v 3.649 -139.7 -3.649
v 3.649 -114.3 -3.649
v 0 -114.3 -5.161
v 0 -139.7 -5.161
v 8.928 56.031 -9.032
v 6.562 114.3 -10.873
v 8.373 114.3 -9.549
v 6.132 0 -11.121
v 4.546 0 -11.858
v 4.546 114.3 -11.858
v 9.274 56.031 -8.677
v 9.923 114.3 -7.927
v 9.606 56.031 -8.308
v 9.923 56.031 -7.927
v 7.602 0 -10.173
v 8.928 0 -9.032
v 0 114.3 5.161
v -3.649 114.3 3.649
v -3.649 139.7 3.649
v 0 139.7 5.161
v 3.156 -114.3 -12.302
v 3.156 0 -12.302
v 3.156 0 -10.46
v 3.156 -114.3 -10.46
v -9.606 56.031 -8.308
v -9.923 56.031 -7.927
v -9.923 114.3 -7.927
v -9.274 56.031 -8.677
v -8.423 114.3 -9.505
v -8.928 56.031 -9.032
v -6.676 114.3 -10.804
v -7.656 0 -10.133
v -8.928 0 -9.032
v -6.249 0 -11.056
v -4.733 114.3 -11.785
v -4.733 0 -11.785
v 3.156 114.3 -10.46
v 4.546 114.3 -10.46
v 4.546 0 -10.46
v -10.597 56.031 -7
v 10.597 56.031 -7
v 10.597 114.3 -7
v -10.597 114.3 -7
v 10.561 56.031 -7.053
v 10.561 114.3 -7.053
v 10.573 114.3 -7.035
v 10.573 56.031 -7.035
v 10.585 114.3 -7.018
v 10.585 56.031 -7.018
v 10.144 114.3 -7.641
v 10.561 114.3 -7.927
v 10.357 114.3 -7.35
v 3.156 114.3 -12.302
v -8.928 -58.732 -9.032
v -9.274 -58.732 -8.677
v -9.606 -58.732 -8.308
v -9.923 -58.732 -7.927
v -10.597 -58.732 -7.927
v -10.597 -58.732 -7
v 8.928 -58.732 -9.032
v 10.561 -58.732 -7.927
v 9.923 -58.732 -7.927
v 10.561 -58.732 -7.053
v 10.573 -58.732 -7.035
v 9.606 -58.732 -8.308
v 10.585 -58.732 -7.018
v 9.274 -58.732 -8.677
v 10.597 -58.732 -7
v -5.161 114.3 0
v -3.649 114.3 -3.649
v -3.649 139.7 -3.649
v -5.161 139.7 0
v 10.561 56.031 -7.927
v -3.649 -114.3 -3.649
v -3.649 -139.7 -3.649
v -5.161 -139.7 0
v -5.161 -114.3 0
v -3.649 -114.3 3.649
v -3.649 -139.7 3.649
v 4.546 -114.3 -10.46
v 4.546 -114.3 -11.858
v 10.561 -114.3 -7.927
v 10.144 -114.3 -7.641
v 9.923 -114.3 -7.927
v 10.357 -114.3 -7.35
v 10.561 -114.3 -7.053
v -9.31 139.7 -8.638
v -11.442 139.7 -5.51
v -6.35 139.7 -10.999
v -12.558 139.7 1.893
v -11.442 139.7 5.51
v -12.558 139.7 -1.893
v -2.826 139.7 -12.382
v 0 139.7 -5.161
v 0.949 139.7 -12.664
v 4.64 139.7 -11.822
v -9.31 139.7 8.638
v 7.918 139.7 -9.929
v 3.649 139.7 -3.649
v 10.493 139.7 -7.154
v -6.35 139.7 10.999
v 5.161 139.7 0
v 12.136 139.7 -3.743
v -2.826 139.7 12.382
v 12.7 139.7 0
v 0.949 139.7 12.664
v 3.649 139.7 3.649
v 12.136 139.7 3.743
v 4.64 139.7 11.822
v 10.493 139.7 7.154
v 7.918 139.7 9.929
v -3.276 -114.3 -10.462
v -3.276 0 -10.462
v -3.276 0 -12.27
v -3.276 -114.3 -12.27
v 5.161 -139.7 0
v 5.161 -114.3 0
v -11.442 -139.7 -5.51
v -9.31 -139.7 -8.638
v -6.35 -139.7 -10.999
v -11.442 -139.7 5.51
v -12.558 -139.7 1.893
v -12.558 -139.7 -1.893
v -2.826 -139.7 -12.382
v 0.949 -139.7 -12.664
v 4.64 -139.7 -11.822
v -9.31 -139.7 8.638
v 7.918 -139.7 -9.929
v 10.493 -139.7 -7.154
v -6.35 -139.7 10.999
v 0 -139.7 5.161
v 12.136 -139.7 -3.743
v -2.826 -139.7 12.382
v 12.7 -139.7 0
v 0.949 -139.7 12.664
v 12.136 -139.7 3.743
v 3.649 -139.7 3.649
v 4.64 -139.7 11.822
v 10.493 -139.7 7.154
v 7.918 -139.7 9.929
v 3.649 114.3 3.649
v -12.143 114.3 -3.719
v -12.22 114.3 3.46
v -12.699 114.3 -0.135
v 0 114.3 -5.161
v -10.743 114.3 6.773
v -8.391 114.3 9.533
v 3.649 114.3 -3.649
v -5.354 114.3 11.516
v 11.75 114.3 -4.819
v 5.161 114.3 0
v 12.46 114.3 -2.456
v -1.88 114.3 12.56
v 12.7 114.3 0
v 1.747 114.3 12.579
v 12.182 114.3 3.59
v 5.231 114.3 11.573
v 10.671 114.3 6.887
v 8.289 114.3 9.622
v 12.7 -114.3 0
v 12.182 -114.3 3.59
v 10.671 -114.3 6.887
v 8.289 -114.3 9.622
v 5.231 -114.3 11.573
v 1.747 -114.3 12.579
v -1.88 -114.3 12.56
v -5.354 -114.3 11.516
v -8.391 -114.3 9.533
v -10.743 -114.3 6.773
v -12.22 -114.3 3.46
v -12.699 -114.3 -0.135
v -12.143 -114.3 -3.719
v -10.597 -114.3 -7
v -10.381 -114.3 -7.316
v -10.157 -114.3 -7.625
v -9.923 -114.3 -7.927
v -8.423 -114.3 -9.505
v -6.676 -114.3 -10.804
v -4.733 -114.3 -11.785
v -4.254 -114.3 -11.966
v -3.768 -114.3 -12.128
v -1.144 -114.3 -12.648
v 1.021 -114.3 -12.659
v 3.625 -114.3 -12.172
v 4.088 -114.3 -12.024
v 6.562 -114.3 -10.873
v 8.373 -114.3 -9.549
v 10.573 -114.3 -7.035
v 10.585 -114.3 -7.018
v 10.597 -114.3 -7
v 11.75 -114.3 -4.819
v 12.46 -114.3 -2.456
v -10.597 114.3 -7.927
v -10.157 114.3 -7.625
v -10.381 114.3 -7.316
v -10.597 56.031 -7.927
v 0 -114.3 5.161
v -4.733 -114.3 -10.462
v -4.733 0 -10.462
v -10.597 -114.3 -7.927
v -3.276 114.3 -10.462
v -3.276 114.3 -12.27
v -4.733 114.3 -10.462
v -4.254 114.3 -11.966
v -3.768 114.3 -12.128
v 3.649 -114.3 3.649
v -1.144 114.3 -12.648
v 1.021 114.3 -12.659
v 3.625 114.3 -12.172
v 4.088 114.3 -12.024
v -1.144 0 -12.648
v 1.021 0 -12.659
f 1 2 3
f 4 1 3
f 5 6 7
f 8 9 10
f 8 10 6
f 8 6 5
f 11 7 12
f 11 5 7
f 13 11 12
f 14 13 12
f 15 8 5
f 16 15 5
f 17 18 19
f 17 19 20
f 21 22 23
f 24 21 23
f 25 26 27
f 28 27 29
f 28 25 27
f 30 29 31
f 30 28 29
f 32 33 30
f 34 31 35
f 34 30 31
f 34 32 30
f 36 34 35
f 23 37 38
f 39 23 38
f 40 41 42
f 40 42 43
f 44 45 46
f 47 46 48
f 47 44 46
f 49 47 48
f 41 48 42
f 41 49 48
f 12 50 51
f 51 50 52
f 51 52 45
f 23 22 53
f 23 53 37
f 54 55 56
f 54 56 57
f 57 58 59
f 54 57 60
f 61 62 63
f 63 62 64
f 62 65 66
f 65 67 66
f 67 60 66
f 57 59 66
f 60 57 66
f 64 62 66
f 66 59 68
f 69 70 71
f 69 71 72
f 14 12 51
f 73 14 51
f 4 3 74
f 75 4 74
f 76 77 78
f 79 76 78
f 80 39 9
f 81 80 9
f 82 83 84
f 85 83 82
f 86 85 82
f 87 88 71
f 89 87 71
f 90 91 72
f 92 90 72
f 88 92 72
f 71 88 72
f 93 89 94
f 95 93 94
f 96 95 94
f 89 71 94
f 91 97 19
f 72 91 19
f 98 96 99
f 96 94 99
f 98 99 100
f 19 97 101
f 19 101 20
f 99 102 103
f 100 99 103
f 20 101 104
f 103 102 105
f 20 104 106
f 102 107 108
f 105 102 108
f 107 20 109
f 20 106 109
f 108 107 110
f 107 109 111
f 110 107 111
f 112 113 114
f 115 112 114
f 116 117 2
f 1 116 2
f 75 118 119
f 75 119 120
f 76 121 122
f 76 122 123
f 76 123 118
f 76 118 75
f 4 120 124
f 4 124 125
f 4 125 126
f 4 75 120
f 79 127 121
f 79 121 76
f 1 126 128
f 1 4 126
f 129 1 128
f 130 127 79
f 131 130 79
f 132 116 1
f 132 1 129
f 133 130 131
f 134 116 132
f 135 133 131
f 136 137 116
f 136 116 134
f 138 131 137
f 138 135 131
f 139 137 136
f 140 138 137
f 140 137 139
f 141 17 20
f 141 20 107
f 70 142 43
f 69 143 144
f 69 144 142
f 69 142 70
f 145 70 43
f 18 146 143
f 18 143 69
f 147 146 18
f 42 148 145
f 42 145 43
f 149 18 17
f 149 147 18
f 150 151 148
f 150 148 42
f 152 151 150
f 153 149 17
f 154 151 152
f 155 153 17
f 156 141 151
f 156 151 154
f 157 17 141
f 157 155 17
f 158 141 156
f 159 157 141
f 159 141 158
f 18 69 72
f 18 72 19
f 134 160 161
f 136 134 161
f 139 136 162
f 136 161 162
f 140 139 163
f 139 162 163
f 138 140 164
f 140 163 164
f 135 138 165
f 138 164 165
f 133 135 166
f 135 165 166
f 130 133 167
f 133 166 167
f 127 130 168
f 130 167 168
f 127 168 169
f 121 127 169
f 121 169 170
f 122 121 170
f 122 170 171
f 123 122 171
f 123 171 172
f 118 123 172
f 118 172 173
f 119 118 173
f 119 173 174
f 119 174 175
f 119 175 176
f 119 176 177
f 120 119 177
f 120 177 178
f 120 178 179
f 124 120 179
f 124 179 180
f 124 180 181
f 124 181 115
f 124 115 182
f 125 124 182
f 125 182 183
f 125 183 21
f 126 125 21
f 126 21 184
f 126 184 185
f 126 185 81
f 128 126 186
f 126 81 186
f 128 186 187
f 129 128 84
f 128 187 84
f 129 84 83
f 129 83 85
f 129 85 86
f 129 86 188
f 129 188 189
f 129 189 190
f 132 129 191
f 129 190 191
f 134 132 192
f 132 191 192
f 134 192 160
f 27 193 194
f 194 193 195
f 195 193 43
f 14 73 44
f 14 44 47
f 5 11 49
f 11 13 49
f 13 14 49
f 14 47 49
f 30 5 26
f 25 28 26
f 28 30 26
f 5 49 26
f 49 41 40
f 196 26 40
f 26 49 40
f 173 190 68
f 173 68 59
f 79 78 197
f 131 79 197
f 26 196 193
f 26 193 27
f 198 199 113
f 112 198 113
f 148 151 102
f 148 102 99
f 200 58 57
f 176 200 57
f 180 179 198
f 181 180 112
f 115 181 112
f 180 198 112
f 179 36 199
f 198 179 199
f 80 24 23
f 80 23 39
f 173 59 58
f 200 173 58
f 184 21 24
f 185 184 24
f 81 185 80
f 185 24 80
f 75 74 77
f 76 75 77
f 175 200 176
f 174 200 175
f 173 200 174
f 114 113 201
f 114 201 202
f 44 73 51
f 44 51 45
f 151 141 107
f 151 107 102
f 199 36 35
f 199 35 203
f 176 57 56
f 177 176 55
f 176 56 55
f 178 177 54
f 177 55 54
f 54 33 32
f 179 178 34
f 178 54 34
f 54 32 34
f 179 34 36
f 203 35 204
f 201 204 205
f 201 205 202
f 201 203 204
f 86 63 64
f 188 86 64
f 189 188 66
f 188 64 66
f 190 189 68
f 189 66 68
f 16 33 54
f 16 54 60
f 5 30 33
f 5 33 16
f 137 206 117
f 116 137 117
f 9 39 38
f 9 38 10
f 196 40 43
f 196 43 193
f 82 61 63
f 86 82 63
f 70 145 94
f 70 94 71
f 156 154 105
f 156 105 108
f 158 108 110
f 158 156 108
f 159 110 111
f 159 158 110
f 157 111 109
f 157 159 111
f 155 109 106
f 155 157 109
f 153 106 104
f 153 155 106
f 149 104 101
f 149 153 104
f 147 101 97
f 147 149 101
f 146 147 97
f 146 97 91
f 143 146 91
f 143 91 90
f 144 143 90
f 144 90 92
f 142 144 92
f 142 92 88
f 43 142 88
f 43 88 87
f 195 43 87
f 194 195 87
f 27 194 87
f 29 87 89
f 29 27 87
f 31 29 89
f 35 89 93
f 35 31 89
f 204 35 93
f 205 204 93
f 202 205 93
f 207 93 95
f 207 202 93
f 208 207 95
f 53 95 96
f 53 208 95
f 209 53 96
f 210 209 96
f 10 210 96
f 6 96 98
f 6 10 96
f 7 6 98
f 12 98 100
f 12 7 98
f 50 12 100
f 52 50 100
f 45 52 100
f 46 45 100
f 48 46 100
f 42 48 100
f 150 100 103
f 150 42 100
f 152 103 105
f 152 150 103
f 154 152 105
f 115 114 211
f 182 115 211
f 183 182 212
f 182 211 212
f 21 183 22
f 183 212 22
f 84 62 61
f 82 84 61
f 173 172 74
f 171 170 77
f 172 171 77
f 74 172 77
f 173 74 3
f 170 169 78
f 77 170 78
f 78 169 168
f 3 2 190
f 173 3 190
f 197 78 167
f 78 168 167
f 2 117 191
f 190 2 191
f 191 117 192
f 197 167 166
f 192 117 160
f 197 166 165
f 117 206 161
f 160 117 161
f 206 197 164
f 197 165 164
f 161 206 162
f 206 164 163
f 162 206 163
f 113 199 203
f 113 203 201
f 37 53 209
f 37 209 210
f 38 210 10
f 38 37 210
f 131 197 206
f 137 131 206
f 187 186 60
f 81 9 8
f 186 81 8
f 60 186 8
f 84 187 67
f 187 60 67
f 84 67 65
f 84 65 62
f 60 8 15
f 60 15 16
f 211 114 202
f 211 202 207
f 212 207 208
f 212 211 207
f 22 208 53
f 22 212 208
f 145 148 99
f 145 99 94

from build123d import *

# Parameters (mm, degrees)
F1_DEPTH = 114.3
F2_R     = 12.7
F3_DEPTH = 25.4
F6_DEPTH = 2.032
F7_DEPTH = 25.4


with BuildPart() as f1:
    # F0 (on Front) → F1 (new body)
    with BuildSketch(Plane.XZ):
        with BuildLine():
            Line((10.5614215136, -7), (-10.5966975988, -7))
            ThreePointArc((-10.5966975988, -7), (-10.2701474295, -7.4708815929), (-9.9226886379, -7.9265534878))
            Line((-9.9226886379, -7.9265534878), (9.9226886379, -7.9265534878))
            ThreePointArc((9.9226886379, -7.9265534878), (10.2513617434, -7.4966380736), (10.5614215136, -7.0531110592))
            Line((10.5614215136, -7.0531110592), (10.5614215136, -7))
        make_face()
        with BuildLine():
            ThreePointArc((-9.9226886379, -7.9265534878), (-10.2701474295, -7.4708815929), (-10.5966975988, -7))
            Line((-10.5966975988, -7), (-10.5966975988, -7.9265534878))
            Line((-10.5966975988, -7.9265534878), (-9.9226886379, -7.9265534878))
        make_face()
        with BuildLine():
            Line((9.9226886379, -7.9265534878), (-9.9226886379, -7.9265534878))
            ThreePointArc((-9.9226886379, -7.9265534878), (-7.5775508356, -10.1916987463), (-4.7329799249, -11.7851135349))
            Line((-4.7329799249, -11.7851135349), (-4.7329799249, -10.4623720994))
            Line((-4.7329799249, -10.4623720994), (-3.2759574242, -10.4623720994))
            Line((-3.2759574242, -10.4623720994), (-3.2759574242, -12.2702120175))
            ThreePointArc((-3.2759574242, -12.2702120175), (-0.0620753883, -12.6998482923), (3.1558530074, -12.3016499623))
            Line((3.1558530074, -12.3016499623), (3.1558530074, -10.4598701178))
            Line((3.1558530074, -10.4598701178), (4.5460122637, -10.4598701178))
            Line((4.5460122637, -10.4598701178), (4.5460122637, -11.8584894695))
            ThreePointArc((4.5460122637, -11.8584894695), (7.4967230566, -10.2512995963), (9.9226886379, -7.9265534878))
        make_face()
        with BuildLine():
            Line((10.5966975988, -7), (10.5614215136, -7))
            Line((10.5614215136, -7), (10.5614215136, -7.0531110592))
            ThreePointArc((10.5614215136, -7.0531110592), (10.5790928859, -7.026577667), (10.5966975988, -7))
        make_face()
        with BuildLine():
            ThreePointArc((10.5614215136, -7.0531110592), (10.2513617434, -7.4966380736), (9.9226886379, -7.9265534878))
            Line((9.9226886379, -7.9265534878), (10.5614215136, -7.9265534878))
            Line((10.5614215136, -7.9265534878), (10.5614215136, -7.0531110592))
        make_face()
    extrude(amount=F1_DEPTH)

    # F2 (on face) → F3 (join)
    with BuildSketch(Plane.XZ.offset(114.3)):
        Circle(F2_R)
        Polygon((-3.6490469896, 3.6490469896), (0, 5.1605317424), (3.6490469896, 3.6490469896), (5.1605317424, 0), (3.6490469896, -3.6490469896), (0, -5.1605317424), (-3.6490469896, -3.6490469896), (-5.1605317424, 0), align=None, mode=Mode.SUBTRACT)
    extrude(amount=F3_DEPTH)

    # F4: F1 across face


with BuildPart() as f1_1:
    add(f1.part)
    add(f1.part.mirror(Plane(origin=(0.0015510549, 0, -9.2088295832), x_dir=(1, 0, 0), z_dir=(0, 1, 0))))

    # F5 (on face) → F6 (cut)
    with BuildSketch(Plane.XY.offset(-7)):
        Polygon((10.5966975988, 56.0314431787), (-10.5966975988, 56.0314431787), (-10.5966975988, -58.7317496538), (10.5966975988, -58.7317496538), (10.5966975988, 0), align=None)
    extrude(amount=-F6_DEPTH, mode=Mode.SUBTRACT)

    # F2 (on face) → F7 (join)
    with BuildSketch(Plane.XZ.offset(114.3)):
        Circle(F2_R)
        Polygon((-3.6490469896, 3.6490469896), (0, 5.1605317424), (3.6490469896, 3.6490469896), (5.1605317424, 0), (3.6490469896, -3.6490469896), (0, -5.1605317424), (-3.6490469896, -3.6490469896), (-5.1605317424, 0), align=None, mode=Mode.SUBTRACT)
    extrude(amount=F7_DEPTH)


solid = f1_1.part
